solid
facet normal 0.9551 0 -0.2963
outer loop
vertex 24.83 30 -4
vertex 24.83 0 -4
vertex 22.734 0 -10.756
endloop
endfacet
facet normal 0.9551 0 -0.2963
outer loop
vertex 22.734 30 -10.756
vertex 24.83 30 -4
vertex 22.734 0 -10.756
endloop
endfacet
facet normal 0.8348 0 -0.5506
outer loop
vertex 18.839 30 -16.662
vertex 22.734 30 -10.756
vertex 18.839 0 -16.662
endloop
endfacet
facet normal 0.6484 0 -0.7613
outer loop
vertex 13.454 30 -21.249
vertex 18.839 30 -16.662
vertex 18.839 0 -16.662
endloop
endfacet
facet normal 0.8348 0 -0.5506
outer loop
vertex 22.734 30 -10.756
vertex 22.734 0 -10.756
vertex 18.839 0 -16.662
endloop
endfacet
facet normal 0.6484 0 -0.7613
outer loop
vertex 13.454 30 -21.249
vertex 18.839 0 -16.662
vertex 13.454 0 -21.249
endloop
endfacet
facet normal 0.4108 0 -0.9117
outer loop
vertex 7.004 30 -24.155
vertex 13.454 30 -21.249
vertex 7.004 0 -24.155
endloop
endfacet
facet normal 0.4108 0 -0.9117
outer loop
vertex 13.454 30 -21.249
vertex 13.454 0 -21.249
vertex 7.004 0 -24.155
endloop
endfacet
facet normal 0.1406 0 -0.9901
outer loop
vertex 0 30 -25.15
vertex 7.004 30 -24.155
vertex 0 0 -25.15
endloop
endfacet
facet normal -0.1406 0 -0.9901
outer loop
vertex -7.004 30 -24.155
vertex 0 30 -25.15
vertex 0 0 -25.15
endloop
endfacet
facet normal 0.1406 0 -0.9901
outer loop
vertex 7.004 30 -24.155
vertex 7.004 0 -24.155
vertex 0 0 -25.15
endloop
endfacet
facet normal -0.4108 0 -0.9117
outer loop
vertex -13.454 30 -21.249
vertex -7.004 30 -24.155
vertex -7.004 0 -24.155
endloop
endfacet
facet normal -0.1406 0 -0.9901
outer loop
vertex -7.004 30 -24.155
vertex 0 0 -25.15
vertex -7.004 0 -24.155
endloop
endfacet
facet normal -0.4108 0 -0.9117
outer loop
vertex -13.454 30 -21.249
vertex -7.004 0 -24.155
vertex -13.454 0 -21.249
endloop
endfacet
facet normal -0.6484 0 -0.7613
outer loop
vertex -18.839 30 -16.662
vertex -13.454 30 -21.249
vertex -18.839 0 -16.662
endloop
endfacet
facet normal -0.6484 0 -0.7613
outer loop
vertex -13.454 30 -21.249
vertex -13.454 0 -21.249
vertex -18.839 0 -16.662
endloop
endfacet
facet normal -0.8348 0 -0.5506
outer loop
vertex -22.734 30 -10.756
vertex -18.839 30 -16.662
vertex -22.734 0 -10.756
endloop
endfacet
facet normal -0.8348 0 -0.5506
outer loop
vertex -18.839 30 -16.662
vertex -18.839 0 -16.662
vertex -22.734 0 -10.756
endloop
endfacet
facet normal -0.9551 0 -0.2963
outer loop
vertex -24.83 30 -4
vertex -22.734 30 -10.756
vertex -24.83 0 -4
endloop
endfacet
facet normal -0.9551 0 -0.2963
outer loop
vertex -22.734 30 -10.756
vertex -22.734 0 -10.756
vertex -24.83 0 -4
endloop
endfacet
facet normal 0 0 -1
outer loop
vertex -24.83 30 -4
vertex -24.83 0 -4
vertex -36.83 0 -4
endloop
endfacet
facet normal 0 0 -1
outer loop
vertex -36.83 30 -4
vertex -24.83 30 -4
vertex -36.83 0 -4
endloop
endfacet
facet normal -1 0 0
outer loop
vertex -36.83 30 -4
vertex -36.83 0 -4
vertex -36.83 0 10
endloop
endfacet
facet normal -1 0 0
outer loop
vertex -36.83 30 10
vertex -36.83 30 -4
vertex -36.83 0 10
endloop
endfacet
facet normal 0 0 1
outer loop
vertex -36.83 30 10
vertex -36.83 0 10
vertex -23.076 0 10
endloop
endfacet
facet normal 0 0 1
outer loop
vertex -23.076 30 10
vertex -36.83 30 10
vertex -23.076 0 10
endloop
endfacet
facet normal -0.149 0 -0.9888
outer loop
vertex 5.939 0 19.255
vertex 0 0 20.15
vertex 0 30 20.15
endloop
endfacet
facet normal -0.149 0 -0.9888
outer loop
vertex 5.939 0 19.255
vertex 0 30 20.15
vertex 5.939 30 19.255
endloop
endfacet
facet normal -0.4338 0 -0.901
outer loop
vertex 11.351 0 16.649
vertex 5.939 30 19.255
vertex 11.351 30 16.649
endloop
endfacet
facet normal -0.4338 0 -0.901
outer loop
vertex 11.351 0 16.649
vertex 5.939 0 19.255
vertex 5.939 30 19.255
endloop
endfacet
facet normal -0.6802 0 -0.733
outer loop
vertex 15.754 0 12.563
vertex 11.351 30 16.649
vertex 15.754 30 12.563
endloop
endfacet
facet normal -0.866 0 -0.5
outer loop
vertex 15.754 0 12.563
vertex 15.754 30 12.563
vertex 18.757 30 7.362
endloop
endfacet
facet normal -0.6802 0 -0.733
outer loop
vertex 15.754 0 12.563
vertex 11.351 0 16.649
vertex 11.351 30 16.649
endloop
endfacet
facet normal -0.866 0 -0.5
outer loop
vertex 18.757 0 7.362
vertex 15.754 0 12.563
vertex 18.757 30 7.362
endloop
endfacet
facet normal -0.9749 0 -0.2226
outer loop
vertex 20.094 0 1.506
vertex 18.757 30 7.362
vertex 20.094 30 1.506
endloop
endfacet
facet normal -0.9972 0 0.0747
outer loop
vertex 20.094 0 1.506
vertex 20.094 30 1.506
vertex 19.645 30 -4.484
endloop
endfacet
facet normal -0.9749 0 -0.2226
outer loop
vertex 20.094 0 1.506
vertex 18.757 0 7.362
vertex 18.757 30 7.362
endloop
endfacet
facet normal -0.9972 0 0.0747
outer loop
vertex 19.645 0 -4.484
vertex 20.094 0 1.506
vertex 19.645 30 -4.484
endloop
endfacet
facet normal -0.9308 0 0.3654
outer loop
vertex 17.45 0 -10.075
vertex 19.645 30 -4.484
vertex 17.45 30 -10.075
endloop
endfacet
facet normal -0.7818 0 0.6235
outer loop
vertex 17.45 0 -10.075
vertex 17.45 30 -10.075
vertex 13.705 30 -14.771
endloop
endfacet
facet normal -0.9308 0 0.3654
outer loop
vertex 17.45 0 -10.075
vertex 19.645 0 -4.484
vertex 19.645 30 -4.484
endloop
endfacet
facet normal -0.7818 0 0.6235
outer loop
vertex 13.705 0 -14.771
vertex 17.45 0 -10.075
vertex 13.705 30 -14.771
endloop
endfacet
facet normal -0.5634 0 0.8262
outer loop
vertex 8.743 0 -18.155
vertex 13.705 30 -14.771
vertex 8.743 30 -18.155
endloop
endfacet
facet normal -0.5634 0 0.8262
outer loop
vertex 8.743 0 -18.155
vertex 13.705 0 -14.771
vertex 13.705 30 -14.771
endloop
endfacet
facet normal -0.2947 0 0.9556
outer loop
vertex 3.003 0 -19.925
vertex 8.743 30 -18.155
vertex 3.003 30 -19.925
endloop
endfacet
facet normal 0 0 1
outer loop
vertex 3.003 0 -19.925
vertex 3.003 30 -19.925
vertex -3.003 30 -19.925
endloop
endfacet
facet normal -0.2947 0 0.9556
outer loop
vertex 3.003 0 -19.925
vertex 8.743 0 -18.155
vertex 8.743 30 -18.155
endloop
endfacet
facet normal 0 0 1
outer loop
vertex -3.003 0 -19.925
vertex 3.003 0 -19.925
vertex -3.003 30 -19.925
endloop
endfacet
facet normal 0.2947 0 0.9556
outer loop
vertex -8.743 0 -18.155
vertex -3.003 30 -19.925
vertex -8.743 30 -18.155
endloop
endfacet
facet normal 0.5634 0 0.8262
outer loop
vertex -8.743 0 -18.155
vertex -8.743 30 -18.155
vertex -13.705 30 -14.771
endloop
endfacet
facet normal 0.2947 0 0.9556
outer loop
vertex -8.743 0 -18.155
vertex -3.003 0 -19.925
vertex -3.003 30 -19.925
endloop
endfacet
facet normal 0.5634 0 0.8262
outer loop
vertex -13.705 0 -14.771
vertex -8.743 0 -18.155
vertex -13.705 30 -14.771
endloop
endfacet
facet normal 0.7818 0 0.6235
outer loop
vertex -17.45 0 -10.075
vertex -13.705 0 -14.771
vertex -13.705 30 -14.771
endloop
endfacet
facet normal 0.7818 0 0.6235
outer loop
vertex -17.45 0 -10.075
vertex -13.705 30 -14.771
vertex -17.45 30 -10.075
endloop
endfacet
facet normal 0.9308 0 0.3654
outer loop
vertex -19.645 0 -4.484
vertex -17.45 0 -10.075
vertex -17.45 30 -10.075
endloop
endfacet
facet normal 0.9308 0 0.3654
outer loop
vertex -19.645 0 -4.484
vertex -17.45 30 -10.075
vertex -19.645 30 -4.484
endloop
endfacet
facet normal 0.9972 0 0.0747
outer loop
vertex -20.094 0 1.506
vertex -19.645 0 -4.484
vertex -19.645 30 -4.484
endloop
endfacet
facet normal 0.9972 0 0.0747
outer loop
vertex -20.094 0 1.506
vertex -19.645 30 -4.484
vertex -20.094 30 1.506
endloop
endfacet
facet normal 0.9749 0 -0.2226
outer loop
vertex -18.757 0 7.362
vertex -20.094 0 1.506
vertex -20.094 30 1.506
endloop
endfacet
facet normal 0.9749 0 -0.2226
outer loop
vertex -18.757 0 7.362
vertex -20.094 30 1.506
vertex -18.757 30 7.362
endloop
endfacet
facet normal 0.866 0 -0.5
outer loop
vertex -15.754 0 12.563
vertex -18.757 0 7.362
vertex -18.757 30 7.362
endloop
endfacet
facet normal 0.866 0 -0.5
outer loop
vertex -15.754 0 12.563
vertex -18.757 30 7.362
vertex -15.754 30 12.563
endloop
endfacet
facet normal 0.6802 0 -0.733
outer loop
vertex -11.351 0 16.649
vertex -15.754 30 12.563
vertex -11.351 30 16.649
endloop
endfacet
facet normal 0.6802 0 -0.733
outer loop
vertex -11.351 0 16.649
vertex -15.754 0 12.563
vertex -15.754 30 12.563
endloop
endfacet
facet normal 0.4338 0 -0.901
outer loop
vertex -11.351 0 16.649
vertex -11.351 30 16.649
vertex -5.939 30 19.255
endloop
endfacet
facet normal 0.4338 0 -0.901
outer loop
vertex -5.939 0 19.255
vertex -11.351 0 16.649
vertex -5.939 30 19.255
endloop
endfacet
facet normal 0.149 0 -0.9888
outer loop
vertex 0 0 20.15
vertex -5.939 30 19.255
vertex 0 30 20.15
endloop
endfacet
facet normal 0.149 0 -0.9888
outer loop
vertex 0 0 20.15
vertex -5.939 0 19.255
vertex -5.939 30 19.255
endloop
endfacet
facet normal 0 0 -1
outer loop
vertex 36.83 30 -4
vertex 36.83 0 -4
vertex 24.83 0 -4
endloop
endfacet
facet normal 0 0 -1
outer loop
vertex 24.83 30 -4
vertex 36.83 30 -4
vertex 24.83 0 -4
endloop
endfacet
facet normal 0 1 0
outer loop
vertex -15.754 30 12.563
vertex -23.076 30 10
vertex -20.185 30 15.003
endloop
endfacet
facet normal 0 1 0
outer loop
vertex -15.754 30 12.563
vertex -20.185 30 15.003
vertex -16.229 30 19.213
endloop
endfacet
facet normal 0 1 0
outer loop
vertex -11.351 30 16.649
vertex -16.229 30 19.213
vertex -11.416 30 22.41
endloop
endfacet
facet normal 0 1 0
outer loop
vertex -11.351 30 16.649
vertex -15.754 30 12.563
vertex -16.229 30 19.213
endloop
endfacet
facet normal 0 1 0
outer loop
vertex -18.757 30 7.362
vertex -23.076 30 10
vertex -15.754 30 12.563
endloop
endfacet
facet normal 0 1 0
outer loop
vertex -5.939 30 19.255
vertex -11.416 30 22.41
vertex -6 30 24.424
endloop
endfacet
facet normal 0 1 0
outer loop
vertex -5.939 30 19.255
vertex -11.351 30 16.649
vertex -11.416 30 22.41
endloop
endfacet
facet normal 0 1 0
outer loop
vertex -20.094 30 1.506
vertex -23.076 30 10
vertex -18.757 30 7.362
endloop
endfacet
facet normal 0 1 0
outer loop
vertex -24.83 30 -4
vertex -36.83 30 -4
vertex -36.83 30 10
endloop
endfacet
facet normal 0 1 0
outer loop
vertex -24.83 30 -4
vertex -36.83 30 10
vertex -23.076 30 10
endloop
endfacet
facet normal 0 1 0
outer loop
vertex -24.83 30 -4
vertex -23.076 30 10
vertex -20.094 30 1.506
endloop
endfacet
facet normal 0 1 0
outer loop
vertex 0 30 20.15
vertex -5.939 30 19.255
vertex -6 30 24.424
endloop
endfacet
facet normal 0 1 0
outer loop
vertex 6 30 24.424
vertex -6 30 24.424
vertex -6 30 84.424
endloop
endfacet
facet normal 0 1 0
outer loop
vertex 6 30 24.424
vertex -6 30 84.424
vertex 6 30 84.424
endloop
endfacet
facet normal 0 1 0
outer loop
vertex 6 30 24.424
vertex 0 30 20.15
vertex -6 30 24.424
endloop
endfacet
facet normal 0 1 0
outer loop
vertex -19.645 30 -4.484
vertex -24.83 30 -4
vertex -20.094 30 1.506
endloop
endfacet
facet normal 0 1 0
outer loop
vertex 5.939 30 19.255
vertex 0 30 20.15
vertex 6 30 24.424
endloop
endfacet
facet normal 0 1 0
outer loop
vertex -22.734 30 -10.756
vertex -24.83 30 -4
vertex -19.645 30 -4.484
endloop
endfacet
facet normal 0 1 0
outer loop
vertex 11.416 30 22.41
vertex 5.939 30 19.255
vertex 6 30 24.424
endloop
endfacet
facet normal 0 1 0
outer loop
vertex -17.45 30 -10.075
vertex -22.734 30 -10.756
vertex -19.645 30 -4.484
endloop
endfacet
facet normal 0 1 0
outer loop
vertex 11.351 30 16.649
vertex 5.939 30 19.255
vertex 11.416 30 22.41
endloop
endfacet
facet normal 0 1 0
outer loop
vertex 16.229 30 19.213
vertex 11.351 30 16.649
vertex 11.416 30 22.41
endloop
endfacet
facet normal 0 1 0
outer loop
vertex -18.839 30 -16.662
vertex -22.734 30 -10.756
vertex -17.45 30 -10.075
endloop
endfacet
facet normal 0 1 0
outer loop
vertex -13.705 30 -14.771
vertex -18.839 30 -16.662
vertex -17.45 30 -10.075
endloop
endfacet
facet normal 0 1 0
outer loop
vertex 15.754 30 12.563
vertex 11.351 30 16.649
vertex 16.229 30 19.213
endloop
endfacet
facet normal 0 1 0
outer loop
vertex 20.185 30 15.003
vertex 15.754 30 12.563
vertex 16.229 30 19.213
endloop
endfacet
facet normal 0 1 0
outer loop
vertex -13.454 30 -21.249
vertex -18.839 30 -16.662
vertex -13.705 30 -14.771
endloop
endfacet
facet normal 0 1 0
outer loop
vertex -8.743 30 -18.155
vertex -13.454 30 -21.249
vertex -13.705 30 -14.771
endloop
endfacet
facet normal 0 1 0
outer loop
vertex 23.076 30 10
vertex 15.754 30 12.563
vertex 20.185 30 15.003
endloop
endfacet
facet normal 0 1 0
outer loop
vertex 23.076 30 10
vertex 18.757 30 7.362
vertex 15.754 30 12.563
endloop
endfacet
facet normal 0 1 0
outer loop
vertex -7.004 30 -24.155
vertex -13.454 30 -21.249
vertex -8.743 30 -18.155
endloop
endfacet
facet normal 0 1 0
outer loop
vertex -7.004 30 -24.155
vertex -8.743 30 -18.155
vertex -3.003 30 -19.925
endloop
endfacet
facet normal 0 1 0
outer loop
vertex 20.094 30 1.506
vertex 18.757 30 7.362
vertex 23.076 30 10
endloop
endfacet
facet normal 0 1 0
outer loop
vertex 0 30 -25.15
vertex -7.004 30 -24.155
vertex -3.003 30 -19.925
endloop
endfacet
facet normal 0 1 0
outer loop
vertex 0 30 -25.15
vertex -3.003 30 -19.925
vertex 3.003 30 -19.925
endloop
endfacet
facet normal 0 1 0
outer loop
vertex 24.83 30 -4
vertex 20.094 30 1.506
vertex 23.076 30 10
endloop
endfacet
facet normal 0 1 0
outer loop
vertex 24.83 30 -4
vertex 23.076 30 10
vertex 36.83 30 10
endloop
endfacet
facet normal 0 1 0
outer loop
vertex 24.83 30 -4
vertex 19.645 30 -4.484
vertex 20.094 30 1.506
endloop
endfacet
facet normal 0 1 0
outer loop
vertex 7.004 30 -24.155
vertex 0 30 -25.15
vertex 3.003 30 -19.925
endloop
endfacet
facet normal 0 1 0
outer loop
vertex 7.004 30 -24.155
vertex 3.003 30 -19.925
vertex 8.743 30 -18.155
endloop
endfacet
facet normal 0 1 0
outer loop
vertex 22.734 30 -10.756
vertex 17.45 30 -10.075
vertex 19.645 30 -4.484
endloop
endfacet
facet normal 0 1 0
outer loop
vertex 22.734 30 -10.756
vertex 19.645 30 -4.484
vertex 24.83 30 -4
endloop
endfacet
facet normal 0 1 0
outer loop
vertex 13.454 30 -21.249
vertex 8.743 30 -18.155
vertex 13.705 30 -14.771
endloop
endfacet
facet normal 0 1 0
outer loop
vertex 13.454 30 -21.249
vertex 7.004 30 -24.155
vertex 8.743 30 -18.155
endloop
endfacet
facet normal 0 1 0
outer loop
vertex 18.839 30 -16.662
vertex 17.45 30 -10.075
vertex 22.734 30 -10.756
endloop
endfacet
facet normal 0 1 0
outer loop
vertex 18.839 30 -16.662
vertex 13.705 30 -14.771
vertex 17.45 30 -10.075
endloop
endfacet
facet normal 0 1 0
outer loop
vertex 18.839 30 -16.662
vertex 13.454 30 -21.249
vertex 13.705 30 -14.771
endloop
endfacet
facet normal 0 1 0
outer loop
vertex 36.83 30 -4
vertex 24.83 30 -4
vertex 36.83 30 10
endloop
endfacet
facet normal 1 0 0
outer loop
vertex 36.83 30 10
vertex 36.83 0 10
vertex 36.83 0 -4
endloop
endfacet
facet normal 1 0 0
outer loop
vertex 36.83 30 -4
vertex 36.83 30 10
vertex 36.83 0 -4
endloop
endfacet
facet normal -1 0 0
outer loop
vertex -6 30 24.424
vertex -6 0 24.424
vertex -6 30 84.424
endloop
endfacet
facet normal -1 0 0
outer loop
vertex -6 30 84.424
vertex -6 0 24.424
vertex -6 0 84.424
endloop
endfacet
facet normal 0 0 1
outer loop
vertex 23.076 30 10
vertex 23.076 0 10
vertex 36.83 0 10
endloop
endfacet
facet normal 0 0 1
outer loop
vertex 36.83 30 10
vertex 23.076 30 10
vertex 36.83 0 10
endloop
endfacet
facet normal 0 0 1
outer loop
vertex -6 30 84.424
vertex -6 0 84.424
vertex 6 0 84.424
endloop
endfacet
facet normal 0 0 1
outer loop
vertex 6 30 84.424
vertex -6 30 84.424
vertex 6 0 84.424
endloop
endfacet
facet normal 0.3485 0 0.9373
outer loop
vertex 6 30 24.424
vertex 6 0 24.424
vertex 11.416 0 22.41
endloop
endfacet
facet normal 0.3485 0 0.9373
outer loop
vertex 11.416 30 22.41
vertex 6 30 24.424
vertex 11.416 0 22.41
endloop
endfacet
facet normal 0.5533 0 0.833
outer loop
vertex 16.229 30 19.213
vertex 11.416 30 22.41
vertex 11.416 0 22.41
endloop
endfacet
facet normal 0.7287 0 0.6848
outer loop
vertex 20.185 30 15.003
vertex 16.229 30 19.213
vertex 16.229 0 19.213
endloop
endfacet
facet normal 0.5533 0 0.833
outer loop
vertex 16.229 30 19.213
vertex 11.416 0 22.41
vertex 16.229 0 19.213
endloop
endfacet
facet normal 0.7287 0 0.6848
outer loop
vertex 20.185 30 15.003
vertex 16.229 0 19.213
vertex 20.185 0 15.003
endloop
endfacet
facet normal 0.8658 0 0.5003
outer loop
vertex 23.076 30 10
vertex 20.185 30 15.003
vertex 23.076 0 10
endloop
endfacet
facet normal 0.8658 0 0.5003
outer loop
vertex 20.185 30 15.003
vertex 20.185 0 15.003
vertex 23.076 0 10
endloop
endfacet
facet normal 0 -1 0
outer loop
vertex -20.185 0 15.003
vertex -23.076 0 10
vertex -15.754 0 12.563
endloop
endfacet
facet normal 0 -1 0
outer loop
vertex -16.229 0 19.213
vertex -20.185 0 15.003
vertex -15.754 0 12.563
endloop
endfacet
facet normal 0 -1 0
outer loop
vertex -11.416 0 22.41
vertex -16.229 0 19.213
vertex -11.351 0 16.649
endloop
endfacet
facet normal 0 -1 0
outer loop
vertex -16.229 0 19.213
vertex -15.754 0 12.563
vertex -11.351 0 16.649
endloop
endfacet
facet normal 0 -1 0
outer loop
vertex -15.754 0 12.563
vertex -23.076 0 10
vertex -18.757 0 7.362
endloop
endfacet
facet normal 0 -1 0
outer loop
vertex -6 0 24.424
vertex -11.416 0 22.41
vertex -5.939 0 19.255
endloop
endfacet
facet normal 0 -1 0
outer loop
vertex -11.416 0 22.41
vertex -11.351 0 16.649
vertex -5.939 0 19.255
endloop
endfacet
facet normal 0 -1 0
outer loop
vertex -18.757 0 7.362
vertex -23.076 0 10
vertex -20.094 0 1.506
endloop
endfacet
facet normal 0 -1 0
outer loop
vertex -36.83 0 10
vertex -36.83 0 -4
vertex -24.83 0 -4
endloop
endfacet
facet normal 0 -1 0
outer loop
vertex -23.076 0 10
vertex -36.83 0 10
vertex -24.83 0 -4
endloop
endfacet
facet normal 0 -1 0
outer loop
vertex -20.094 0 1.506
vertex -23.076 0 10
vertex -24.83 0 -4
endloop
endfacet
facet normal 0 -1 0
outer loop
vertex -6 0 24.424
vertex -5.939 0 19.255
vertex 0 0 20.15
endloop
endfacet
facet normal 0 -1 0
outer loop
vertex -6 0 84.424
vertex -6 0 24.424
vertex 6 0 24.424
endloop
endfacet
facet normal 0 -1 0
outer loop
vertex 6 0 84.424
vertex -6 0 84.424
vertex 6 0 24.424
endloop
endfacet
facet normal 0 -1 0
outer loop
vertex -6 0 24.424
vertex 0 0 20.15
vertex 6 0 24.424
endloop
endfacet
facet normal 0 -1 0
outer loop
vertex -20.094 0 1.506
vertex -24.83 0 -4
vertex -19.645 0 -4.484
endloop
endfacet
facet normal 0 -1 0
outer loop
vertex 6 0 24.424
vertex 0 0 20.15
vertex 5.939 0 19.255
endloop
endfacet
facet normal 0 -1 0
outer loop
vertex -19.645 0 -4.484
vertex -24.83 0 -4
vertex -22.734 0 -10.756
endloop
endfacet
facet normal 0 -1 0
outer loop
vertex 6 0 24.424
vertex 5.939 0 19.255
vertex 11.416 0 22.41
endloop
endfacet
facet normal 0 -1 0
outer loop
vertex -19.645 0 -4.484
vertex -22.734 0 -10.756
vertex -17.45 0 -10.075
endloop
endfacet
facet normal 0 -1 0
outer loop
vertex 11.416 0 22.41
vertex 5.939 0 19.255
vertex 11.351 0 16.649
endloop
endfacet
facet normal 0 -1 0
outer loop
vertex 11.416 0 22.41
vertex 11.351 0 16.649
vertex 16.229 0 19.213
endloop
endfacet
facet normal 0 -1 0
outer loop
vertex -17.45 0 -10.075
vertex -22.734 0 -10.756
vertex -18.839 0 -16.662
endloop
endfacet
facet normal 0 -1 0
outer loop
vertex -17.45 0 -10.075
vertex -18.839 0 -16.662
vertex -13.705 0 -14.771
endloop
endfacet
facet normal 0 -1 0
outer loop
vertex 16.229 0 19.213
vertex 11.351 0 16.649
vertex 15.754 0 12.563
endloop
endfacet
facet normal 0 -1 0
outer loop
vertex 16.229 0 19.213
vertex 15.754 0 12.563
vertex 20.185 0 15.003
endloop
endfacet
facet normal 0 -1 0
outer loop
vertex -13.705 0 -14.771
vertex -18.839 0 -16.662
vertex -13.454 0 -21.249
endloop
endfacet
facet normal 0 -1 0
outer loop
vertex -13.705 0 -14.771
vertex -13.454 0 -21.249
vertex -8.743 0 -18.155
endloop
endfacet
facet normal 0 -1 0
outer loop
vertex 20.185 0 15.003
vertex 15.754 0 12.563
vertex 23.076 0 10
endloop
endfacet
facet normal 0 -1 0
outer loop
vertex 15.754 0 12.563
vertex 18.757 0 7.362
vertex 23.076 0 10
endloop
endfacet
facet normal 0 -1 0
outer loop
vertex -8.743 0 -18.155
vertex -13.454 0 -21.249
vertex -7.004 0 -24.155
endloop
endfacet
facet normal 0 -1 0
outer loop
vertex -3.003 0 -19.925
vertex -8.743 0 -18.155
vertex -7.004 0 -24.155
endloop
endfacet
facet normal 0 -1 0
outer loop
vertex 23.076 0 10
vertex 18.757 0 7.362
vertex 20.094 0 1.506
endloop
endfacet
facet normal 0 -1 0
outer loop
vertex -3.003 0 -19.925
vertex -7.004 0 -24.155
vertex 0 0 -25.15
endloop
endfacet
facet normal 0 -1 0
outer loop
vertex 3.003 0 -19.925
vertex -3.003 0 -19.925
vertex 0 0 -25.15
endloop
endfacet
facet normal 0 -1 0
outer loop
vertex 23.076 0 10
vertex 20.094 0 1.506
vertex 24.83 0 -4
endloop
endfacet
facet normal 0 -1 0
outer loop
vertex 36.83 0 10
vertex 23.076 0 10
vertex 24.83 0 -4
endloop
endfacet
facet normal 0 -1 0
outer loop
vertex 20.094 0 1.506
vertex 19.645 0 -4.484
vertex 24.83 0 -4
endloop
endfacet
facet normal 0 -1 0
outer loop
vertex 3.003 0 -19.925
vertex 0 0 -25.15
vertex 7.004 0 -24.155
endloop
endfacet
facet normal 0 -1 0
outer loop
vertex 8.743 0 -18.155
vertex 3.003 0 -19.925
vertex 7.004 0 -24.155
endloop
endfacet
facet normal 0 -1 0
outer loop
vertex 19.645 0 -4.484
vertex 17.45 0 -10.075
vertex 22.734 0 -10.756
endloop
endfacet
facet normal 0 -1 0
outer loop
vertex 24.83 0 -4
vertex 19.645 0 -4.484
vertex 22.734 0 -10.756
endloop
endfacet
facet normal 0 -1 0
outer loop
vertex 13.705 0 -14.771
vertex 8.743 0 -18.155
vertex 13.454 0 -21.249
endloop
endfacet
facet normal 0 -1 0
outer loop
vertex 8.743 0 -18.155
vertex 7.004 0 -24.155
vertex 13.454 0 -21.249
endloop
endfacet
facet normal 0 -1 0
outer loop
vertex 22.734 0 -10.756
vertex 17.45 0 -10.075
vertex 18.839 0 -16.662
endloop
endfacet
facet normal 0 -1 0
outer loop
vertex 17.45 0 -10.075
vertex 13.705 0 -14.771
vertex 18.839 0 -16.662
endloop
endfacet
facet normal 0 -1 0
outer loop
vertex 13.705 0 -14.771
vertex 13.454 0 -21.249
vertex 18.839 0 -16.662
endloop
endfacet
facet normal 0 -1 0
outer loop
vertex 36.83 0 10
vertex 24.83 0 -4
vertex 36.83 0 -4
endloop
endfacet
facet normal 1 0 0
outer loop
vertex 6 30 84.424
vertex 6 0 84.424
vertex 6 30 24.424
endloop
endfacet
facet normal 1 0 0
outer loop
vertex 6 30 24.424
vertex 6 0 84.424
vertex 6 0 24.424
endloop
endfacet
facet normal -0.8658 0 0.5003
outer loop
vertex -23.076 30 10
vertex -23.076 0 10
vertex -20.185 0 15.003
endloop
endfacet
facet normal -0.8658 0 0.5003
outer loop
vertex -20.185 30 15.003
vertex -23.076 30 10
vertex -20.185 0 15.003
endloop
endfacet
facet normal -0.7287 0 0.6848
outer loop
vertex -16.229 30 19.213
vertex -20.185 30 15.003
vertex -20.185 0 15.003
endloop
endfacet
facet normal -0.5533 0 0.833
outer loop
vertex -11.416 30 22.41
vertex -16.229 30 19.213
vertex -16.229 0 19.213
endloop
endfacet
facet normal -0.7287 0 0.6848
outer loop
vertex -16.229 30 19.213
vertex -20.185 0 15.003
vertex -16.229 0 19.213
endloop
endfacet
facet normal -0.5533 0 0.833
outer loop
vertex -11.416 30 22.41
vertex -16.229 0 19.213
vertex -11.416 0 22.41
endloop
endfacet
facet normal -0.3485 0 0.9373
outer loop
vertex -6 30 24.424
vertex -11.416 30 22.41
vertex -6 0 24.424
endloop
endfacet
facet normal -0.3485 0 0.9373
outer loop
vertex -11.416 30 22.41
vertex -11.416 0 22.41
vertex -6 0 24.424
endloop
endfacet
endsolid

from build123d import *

# Parameters (mm, degrees)
SKETCH2_R           = 20.15
BOSS_EXTRUDE1_DEPTH = 30


with BuildPart() as part:
    # Sketch2 → Boss-Extrude1 (new body)
    with BuildSketch(Plane(origin=(0, 0, 0), x_dir=(1, 0, 0), z_dir=(0, 1, 0))):
        with BuildLine():
            Line((36.829871123, -10), (36.829871123, 4))
            Line((36.829871123, 4), (24.829871123, 4))
            ThreePointArc((24.829871123, 4), (0, 25.15), (-24.829871123, 4))
            Line((-24.829871123, 4), (-36.829871123, 4))
            Line((-36.829871123, 4), (-36.829871123, -10))
            Line((-36.829871123, -10), (-23.076449034, -10))
            ThreePointArc((-23.076449034, -10), (-16.228725969, -19.213301471), (-6, -24.423810104))
            Line((-6, -24.423810104), (-6, -84.423810104))
            Line((-6, -84.423810104), (6, -84.423810104))
            Line((6, -84.423810104), (6, -24.423810104))
            ThreePointArc((6, -24.423810104), (16.228725969, -19.213301471), (23.076449034, -10))
            Line((23.076449034, -10), (36.829871123, -10))
        make_face()
        with Locations(Location((0, 0, 0), (0, 0, 270))):
            Circle(SKETCH2_R, mode=Mode.SUBTRACT)
    extrude(amount=BOSS_EXTRUDE1_DEPTH)


solid = part.part
